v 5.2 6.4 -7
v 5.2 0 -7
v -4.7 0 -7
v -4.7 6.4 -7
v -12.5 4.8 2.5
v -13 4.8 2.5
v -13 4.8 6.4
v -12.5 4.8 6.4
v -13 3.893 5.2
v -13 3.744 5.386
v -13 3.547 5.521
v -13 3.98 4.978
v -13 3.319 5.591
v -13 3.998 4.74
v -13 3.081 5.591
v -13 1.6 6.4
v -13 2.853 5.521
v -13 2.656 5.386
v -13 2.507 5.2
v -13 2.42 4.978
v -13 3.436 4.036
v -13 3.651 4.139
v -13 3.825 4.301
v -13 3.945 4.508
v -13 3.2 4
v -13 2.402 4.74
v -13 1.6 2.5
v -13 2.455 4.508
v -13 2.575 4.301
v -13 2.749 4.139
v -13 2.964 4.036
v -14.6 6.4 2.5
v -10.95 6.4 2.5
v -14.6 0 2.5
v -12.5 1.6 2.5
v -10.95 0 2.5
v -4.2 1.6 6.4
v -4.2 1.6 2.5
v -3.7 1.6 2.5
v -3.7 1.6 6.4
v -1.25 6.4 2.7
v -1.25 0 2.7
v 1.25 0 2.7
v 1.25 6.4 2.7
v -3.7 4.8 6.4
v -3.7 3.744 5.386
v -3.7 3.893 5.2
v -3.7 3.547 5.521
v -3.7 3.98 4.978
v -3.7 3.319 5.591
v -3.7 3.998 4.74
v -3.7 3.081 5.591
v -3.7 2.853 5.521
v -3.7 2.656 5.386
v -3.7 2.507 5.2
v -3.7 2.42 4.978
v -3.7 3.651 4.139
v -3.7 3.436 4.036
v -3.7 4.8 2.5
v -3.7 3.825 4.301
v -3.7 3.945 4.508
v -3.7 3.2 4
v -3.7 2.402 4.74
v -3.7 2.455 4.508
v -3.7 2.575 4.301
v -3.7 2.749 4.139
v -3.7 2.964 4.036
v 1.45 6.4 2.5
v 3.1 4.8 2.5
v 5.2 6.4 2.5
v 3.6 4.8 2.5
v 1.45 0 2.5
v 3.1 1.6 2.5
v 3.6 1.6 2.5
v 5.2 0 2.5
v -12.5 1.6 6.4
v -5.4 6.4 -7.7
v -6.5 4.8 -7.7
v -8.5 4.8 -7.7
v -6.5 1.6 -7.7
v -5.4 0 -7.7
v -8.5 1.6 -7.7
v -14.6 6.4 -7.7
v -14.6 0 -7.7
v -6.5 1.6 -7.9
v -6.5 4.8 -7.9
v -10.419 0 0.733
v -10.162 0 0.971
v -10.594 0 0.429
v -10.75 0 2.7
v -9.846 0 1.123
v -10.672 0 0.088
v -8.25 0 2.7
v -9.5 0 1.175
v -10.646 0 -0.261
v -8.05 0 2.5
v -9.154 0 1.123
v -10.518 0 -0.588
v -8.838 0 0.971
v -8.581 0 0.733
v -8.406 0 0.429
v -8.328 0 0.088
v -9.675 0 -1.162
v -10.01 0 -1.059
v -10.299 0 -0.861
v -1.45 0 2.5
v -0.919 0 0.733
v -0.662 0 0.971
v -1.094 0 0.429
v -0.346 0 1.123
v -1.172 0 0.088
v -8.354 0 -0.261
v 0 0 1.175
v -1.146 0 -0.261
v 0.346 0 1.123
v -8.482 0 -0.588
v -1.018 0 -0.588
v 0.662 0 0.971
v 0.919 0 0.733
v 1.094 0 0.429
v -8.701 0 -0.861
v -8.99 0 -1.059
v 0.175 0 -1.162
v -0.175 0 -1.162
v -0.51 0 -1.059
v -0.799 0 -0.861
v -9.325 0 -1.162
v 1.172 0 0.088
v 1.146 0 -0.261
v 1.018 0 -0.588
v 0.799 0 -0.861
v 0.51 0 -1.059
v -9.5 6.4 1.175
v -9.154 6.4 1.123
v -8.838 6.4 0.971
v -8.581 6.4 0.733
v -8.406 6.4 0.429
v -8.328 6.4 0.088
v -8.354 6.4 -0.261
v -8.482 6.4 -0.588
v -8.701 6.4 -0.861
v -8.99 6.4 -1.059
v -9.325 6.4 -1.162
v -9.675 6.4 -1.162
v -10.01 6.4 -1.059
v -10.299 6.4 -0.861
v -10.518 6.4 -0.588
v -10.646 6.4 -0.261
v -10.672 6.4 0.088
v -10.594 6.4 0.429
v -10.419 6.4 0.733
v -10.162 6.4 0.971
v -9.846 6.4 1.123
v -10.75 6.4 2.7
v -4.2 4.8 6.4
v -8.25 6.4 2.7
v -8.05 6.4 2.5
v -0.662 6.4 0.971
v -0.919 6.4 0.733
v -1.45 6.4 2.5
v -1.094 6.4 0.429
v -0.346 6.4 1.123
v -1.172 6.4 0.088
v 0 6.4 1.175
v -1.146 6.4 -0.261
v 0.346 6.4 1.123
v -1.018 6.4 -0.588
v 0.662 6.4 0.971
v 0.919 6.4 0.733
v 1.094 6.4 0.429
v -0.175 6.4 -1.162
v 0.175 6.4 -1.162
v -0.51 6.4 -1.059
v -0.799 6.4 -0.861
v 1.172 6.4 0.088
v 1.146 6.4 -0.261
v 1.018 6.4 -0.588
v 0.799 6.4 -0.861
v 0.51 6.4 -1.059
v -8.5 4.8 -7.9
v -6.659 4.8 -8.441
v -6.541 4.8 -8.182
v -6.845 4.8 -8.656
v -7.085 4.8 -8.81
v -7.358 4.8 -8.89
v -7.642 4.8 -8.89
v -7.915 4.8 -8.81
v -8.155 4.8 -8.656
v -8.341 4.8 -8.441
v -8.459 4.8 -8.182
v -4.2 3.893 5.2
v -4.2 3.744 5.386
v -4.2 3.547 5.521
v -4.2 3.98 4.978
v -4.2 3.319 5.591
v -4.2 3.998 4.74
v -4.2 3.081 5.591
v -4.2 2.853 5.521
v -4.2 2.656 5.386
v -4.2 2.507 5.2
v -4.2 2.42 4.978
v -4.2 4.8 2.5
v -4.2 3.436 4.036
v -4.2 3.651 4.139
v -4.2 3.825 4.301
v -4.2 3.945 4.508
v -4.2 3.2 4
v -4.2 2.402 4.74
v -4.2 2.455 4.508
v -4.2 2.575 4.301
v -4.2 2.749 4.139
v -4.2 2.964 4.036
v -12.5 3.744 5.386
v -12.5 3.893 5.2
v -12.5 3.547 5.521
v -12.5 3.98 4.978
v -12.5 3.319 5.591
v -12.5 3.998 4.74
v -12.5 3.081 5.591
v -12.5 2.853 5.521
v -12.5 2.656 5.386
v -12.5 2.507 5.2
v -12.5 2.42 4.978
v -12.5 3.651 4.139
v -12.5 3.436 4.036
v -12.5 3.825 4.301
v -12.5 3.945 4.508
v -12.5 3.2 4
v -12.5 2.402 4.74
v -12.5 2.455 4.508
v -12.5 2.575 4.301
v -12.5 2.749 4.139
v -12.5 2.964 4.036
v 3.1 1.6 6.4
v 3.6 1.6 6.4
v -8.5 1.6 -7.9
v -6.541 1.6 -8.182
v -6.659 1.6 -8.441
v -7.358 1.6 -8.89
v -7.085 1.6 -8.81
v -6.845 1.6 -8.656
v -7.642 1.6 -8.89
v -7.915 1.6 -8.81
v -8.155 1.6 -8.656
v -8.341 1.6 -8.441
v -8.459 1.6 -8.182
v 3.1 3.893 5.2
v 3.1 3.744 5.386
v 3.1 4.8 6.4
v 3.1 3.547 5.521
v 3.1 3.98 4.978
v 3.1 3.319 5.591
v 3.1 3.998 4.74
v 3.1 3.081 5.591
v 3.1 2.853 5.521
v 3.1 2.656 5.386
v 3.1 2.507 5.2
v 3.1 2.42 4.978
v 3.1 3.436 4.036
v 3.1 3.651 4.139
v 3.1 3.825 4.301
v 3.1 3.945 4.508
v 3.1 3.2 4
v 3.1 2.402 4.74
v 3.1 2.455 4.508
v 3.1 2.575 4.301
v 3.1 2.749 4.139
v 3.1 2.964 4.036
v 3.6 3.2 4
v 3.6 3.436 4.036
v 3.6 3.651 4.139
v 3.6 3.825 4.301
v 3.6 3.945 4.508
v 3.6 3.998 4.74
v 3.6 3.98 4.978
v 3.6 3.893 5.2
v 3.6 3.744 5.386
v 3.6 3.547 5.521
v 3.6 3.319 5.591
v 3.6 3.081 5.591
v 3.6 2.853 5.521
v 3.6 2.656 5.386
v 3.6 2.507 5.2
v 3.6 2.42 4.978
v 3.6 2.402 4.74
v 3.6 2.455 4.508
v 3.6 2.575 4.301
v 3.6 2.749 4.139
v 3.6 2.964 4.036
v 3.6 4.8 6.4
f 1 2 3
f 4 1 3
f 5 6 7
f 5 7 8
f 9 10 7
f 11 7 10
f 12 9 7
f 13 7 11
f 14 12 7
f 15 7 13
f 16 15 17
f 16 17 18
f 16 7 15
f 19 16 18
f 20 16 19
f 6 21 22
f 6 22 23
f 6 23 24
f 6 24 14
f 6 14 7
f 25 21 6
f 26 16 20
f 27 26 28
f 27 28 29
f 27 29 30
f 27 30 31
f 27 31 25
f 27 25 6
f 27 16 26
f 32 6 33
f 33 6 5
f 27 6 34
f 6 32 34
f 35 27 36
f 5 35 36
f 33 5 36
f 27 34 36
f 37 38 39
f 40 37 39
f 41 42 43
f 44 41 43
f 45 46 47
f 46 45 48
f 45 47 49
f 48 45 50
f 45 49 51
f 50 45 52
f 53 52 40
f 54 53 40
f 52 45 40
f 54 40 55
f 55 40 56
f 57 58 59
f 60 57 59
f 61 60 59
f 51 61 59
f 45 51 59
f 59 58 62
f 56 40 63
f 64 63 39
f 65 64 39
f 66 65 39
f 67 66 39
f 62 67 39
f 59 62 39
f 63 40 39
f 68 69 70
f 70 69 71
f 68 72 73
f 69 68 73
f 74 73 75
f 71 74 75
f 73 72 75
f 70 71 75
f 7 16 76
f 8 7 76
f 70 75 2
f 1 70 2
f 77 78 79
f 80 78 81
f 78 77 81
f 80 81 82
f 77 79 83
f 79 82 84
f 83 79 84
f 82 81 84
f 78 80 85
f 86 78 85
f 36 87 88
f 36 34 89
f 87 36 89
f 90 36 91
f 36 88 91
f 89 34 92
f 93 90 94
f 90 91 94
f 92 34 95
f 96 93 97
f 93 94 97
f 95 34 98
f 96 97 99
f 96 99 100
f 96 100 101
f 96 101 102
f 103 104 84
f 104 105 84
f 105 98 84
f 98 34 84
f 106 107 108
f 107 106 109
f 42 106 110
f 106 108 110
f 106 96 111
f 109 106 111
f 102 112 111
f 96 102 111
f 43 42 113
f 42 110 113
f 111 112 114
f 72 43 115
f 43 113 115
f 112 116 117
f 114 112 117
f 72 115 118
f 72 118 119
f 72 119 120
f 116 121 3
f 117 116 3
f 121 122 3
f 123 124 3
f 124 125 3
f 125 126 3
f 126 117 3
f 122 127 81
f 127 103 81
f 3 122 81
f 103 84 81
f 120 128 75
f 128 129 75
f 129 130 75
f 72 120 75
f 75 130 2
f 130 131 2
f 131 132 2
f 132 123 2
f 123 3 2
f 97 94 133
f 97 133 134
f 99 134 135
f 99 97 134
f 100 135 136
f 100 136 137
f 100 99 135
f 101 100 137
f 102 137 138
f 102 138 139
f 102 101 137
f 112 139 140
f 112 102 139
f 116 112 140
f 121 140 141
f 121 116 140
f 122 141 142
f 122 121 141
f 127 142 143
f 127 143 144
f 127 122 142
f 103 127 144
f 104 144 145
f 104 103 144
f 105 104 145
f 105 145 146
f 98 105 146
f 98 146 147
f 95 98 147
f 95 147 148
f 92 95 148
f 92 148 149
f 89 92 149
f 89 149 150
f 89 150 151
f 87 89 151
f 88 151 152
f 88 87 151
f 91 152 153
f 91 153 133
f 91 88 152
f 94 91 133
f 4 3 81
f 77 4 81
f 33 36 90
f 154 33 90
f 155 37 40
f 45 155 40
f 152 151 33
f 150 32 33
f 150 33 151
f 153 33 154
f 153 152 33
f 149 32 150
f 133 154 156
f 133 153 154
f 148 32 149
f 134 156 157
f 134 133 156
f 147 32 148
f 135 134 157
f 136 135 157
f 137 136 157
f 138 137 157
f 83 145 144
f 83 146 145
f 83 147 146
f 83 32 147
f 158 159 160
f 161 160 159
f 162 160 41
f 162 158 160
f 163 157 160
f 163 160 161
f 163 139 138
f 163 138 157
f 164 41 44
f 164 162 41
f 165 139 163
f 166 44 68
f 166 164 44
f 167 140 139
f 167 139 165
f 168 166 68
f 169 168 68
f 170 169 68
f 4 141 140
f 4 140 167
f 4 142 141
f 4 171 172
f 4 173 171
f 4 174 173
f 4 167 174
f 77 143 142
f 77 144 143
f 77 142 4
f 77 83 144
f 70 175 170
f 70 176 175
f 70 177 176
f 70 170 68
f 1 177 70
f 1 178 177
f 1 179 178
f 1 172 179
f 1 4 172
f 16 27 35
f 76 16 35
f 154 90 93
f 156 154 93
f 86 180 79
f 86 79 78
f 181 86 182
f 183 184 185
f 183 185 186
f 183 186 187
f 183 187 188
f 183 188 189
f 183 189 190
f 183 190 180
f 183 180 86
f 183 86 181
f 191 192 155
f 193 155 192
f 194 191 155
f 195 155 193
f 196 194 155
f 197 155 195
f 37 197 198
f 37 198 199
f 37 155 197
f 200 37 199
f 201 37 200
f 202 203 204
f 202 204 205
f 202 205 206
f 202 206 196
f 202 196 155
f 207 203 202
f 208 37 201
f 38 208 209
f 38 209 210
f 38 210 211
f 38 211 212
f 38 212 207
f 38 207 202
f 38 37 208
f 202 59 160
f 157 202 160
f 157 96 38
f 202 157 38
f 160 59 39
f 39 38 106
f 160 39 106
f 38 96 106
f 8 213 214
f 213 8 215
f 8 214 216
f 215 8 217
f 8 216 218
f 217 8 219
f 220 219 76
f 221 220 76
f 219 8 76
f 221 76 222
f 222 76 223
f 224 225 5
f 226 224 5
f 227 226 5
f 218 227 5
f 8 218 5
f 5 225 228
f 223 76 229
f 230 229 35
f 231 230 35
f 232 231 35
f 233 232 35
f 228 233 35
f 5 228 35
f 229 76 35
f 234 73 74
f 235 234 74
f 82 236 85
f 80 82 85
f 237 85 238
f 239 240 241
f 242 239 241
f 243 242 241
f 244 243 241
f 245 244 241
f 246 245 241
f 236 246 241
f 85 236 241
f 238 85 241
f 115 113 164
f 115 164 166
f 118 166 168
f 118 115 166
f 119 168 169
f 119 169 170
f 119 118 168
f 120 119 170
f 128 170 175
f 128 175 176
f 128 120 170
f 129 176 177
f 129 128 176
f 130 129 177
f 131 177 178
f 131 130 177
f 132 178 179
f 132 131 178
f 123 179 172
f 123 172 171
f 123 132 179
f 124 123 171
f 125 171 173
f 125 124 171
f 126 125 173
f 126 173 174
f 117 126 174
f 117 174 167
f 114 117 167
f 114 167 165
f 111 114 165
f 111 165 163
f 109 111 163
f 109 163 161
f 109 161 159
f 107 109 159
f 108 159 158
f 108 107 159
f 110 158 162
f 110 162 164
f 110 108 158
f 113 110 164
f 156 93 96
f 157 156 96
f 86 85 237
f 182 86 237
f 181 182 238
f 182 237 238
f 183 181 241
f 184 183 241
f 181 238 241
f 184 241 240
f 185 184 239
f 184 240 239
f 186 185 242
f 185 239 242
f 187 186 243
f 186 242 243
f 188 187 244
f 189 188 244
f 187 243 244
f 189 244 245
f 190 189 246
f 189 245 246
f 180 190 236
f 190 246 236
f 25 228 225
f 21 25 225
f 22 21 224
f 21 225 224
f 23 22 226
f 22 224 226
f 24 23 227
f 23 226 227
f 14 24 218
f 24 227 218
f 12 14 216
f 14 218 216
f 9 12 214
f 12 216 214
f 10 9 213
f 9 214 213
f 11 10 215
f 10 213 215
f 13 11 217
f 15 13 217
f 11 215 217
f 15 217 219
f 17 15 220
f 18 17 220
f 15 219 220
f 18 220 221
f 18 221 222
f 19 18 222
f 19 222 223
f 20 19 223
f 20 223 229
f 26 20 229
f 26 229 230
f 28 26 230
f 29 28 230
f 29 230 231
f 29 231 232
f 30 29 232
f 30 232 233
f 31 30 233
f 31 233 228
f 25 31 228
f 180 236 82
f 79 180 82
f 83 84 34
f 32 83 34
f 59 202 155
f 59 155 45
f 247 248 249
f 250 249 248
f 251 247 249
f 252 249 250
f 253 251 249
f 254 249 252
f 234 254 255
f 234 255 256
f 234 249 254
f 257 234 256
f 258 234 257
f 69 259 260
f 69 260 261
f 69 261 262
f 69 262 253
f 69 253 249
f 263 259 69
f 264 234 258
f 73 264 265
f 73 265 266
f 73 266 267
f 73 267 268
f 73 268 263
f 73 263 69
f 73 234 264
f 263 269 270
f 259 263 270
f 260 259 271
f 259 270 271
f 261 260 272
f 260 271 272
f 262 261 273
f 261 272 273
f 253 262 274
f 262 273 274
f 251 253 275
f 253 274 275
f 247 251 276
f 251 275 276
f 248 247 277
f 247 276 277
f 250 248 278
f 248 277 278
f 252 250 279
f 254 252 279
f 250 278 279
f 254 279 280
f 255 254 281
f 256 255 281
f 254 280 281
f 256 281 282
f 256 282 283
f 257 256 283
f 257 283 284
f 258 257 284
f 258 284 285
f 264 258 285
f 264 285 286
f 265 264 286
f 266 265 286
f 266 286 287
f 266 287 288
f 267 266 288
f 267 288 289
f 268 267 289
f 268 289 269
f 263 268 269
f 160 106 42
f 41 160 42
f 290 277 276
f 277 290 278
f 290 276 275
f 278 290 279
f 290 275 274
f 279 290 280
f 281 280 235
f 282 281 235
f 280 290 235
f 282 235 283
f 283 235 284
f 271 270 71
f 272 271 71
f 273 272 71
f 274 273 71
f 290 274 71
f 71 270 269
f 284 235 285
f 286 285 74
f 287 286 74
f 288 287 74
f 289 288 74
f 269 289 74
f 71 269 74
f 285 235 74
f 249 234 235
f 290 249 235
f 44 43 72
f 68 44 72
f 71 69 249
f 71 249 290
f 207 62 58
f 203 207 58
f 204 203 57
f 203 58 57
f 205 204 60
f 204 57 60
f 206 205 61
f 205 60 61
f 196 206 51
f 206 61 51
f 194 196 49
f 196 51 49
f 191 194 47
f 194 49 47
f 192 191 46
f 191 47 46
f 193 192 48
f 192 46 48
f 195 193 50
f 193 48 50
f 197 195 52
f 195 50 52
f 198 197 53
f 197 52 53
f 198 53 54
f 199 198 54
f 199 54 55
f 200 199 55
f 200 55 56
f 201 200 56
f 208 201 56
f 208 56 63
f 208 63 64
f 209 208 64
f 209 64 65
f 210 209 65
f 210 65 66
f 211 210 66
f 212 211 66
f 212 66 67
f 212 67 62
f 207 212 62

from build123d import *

# Parameters (mm, degrees)
SKETCH1_R           = 1.175
BOSS_EXTRUDE1_DEPTH = 6.4
BOSS_EXTRUDE2_DEPTH = 3.2
SKETCH4_W           = 0.5
SKETCH4_H           = 3.9
BOSS_EXTRUDE3_DEPTH = 3.2
SKETCH5_R           = 0.8
CUT_EXTRUDE1_DEPTH  = 22.246411462


with BuildPart() as part:
    # Sketch1 → Boss-Extrude1 (new body)
    with BuildSketch(Plane(origin=(0, 0, 0), x_dir=(1, 0, 0), z_dir=(0, 1, 0))):
        Polygon((-10.95, -2.5), (-10.75, -2.7), (-8.25, -2.7), (-8.05, -2.5), (-1.45, -2.5), (-1.25, -2.7), (1.25, -2.7), (1.45, -2.5), (5.2, -2.5), (5.2, 7), (-4.7, 7), (-5.4, 7.7), (-14.6, 7.7), (-14.6, -2.5), align=None)
        with Locations(Location((0, 0, 0), (0, 0, 270))):
            Circle(SKETCH1_R, mode=Mode.SUBTRACT)
        with Locations(Location((-9.5, 0, 0), (0, 0, 270))):
            Circle(SKETCH1_R, mode=Mode.SUBTRACT)
    extrude(amount=BOSS_EXTRUDE1_DEPTH)

    # Sketch3 → Boss-Extrude2 (add)
    with BuildSketch(Plane(origin=(0, 1.6, 0), x_dir=(1, 0, 0), z_dir=(0, 1, 0))):
        with BuildLine():
            Line((-8.5, 7), (-6.5, 7))
            Line((-6.5, 7), (-6.5, 7.9))
            ThreePointArc((-6.5, 7.9), (-7.5, 8.9), (-8.5, 7.9))
            Line((-8.5, 7.9), (-8.5, 7))
        make_face()
    extrude(amount=BOSS_EXTRUDE2_DEPTH)

    # Sketch4 → Boss-Extrude3 (add)
    with BuildSketch(Plane(origin=(0, 1.6, 0), x_dir=(1, 0, 0), z_dir=(0, 1, 0))):
        with Locations((-12.75, -4.45)):
            Rectangle(SKETCH4_W, SKETCH4_H)
        with Locations((-3.95, -4.45)):
            Rectangle(SKETCH4_W, SKETCH4_H)
        with Locations((3.35, -4.45)):
            Rectangle(SKETCH4_W, SKETCH4_H)
    extrude(amount=BOSS_EXTRUDE3_DEPTH)

    # Sketch5 → Cut-Extrude1 (cut, through all)
    with BuildSketch(Plane(origin=(3.6, 0, 0), x_dir=(0, 0, -1), z_dir=(1, 0, 0))):
        with Locations((-4.8, 3.2)):
            Circle(SKETCH5_R)
    extrude(amount=-CUT_EXTRUDE1_DEPTH, mode=Mode.SUBTRACT)


solid = part.part
